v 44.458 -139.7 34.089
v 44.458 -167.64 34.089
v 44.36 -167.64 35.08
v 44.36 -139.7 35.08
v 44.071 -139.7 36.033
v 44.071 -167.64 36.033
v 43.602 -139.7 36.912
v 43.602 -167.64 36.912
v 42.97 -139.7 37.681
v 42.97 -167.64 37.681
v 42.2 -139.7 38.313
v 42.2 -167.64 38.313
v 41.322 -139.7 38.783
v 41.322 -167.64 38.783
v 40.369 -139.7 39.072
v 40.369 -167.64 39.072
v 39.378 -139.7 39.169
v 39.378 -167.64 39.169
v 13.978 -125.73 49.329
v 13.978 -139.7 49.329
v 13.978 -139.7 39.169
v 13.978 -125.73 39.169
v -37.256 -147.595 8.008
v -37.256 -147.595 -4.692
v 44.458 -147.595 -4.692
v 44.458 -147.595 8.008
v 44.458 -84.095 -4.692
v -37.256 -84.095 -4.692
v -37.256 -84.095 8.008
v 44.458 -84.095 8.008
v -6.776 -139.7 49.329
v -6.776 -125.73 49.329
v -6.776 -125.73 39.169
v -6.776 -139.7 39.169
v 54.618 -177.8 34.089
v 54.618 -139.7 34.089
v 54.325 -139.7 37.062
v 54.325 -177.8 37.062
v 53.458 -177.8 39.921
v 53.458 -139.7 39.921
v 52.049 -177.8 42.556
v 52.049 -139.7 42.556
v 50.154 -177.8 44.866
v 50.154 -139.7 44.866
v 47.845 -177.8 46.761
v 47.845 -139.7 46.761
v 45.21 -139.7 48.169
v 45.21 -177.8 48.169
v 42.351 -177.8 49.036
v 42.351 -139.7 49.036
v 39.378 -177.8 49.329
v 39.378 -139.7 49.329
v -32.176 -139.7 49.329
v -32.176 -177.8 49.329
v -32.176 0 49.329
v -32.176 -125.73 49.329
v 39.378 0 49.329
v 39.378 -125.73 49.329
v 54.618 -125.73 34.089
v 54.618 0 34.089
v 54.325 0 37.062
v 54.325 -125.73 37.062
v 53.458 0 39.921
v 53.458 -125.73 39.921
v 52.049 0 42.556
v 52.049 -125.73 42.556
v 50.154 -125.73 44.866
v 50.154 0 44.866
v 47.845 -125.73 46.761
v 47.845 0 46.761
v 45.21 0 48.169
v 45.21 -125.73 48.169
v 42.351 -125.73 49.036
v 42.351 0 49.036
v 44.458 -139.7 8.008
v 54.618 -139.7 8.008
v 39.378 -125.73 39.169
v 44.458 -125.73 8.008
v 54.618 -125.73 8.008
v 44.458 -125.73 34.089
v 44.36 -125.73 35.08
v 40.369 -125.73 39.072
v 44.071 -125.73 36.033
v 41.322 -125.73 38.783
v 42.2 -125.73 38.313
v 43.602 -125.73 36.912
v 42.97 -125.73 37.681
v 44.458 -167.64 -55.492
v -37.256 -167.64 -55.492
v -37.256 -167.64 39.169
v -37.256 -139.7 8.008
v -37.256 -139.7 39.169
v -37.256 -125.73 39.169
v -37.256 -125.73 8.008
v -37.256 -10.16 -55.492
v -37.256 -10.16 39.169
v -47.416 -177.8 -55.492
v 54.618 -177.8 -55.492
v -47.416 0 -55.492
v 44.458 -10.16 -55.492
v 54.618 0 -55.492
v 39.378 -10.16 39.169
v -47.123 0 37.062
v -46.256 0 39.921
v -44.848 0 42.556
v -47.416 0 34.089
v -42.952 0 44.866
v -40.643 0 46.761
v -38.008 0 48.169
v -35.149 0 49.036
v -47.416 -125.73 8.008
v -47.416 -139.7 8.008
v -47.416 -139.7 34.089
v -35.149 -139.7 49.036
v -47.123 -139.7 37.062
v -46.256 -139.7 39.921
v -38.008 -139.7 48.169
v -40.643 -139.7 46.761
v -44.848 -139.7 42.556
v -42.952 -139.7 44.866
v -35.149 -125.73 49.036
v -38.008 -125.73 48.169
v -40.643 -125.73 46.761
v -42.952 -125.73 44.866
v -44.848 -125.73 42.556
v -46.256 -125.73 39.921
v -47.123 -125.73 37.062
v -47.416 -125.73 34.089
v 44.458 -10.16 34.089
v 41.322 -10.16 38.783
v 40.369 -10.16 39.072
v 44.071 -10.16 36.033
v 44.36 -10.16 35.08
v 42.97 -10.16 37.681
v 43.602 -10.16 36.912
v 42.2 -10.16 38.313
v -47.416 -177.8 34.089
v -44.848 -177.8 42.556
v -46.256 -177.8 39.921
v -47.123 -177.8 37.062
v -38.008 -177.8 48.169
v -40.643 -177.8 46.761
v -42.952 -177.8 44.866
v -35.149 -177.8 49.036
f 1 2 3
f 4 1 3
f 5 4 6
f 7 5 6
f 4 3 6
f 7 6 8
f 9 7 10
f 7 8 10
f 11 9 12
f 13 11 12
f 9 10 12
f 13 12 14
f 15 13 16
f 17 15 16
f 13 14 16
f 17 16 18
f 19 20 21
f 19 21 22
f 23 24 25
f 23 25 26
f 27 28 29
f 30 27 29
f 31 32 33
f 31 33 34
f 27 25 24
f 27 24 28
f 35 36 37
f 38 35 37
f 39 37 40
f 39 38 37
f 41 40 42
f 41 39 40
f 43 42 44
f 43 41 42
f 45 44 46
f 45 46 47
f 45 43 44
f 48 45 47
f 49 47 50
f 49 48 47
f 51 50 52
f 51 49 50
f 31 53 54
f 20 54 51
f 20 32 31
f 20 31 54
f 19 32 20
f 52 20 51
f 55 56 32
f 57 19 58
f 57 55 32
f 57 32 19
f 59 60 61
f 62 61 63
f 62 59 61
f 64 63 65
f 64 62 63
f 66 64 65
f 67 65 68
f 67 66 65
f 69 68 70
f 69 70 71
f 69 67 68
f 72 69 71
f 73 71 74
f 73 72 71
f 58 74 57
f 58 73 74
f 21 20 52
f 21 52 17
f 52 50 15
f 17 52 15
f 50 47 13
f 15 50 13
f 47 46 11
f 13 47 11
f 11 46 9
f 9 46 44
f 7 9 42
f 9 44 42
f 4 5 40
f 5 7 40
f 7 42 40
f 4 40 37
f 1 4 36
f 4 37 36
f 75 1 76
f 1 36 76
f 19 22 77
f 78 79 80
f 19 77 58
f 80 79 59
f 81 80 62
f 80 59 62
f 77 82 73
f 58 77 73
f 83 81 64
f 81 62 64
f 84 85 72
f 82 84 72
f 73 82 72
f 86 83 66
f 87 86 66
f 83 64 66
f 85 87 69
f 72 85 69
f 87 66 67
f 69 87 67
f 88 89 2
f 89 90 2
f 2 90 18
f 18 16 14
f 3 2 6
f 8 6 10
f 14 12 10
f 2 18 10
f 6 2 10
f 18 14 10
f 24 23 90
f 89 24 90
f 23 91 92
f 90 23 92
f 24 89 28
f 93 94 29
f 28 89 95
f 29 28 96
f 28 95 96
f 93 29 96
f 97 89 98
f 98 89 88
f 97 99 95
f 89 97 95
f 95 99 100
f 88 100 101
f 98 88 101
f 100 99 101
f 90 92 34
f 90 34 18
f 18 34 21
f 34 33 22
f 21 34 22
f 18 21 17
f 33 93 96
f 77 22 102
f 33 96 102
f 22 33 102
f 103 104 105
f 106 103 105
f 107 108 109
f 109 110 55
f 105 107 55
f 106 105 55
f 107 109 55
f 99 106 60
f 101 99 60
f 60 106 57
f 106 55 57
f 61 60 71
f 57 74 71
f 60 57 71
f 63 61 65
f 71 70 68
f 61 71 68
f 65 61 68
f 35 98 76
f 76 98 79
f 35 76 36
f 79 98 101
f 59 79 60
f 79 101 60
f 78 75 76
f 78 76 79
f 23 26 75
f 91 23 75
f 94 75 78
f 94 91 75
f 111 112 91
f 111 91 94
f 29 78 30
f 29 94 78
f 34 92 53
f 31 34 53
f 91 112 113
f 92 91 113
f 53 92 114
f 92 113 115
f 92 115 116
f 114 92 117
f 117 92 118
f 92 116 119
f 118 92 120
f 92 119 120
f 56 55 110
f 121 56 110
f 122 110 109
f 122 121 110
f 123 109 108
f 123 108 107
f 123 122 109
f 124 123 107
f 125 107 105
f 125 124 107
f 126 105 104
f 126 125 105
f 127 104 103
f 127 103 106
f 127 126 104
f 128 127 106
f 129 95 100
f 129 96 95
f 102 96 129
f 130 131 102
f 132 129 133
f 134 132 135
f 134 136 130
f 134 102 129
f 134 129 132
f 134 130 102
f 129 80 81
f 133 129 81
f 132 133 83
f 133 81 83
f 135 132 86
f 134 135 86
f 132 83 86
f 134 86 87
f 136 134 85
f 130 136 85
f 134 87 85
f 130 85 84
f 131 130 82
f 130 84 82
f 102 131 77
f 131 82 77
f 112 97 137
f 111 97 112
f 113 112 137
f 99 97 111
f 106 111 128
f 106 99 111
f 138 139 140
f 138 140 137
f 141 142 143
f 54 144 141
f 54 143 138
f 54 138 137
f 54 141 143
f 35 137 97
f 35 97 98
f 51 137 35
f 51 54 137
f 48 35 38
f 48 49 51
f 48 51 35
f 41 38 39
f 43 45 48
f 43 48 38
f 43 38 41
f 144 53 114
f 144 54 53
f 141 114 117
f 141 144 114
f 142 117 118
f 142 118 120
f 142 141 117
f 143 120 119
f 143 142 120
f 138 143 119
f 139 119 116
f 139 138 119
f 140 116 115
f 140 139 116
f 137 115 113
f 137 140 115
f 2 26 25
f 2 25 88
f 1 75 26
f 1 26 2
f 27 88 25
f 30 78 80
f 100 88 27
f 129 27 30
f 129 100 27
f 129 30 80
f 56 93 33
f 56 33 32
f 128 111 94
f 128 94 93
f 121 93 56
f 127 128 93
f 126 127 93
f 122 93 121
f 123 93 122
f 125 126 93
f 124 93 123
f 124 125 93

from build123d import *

# Parameters (mm, degrees)
F0_W      = 102.0336635411
F0_H      = 104.8214659095
F1_DEPTH  = 177.8
F2_R      = 15.24
F3_T      = -10.16
F4_W      = 13.97
F4_H      = 21.2457677329
F4_H_2    = 26.0814659095
F6_DEPTH  = 40.64
F5_W      = 13.97
F5_H      = 46.4908947945
F7_DEPTH  = 40.64
F8_R      = 15.24
F10_W     = 63.5
F10_H     = 12.7
F11_DEPTH = 91.186


with BuildPart() as f1:
    # F0 (on Front) → F1 (new body)
    with BuildSketch(Plane.XZ):
        with Locations((3.6009196192, -3.0814781785)):
            Rectangle(F0_W, F0_H)
    extrude(amount=F1_DEPTH)

    # F2
    f2_edges = [f1.edges().sort_by_distance(p)[0] for p in [
        (54.617751, -88.9, 49.329255),
    ]]
    fillet(f2_edges, radius=F2_R)

    # F3
    f3_openings = [f1.faces().sort_by_distance(p)[0] for p in [
        (3.60092, -88.9, -55.492211),
    ]]
    offset(amount=F3_T, openings=f3_openings)

    # F4 (on face) → F6 (cut)
    with BuildSketch(Plane.YZ.offset(54.6177513897)):
        with Locations((-132.715, 44.7121386427)):
            Rectangle(F4_W, F4_H)
        with Locations((-132.715, 21.0485218215)):
            Rectangle(F4_W, F4_H_2)
    extrude(amount=-F6_DEPTH, mode=Mode.SUBTRACT)

    # F5 (on face) → F7 (cut)
    with BuildSketch(Plane(origin=(-47.4159121513, 0, 0), x_dir=(0, -1, 0), z_dir=(-1, 0, 0))):
        with Locations((132.715, 31.253236264)):
            Rectangle(F5_W, F5_H)
    extrude(amount=-F7_DEPTH, mode=Mode.SUBTRACT)

    # F8
    f8_edges = [f1.edges().sort_by_distance(p)[0] for p in [
        (-47.415912, -62.865, 49.329255),
        (-47.415912, -158.75, 49.329255),
    ]]
    fillet(f8_edges, radius=F8_R)

    # F10 (on face) → F11 (join)
    with BuildSketch(Plane.YZ.offset(-37.2559121513)):
        with Locations((-115.8445860147, 1.6577888668)):
            Rectangle(F10_W, F10_H)
    extrude(amount=F11_DEPTH)


solid = f1.part
